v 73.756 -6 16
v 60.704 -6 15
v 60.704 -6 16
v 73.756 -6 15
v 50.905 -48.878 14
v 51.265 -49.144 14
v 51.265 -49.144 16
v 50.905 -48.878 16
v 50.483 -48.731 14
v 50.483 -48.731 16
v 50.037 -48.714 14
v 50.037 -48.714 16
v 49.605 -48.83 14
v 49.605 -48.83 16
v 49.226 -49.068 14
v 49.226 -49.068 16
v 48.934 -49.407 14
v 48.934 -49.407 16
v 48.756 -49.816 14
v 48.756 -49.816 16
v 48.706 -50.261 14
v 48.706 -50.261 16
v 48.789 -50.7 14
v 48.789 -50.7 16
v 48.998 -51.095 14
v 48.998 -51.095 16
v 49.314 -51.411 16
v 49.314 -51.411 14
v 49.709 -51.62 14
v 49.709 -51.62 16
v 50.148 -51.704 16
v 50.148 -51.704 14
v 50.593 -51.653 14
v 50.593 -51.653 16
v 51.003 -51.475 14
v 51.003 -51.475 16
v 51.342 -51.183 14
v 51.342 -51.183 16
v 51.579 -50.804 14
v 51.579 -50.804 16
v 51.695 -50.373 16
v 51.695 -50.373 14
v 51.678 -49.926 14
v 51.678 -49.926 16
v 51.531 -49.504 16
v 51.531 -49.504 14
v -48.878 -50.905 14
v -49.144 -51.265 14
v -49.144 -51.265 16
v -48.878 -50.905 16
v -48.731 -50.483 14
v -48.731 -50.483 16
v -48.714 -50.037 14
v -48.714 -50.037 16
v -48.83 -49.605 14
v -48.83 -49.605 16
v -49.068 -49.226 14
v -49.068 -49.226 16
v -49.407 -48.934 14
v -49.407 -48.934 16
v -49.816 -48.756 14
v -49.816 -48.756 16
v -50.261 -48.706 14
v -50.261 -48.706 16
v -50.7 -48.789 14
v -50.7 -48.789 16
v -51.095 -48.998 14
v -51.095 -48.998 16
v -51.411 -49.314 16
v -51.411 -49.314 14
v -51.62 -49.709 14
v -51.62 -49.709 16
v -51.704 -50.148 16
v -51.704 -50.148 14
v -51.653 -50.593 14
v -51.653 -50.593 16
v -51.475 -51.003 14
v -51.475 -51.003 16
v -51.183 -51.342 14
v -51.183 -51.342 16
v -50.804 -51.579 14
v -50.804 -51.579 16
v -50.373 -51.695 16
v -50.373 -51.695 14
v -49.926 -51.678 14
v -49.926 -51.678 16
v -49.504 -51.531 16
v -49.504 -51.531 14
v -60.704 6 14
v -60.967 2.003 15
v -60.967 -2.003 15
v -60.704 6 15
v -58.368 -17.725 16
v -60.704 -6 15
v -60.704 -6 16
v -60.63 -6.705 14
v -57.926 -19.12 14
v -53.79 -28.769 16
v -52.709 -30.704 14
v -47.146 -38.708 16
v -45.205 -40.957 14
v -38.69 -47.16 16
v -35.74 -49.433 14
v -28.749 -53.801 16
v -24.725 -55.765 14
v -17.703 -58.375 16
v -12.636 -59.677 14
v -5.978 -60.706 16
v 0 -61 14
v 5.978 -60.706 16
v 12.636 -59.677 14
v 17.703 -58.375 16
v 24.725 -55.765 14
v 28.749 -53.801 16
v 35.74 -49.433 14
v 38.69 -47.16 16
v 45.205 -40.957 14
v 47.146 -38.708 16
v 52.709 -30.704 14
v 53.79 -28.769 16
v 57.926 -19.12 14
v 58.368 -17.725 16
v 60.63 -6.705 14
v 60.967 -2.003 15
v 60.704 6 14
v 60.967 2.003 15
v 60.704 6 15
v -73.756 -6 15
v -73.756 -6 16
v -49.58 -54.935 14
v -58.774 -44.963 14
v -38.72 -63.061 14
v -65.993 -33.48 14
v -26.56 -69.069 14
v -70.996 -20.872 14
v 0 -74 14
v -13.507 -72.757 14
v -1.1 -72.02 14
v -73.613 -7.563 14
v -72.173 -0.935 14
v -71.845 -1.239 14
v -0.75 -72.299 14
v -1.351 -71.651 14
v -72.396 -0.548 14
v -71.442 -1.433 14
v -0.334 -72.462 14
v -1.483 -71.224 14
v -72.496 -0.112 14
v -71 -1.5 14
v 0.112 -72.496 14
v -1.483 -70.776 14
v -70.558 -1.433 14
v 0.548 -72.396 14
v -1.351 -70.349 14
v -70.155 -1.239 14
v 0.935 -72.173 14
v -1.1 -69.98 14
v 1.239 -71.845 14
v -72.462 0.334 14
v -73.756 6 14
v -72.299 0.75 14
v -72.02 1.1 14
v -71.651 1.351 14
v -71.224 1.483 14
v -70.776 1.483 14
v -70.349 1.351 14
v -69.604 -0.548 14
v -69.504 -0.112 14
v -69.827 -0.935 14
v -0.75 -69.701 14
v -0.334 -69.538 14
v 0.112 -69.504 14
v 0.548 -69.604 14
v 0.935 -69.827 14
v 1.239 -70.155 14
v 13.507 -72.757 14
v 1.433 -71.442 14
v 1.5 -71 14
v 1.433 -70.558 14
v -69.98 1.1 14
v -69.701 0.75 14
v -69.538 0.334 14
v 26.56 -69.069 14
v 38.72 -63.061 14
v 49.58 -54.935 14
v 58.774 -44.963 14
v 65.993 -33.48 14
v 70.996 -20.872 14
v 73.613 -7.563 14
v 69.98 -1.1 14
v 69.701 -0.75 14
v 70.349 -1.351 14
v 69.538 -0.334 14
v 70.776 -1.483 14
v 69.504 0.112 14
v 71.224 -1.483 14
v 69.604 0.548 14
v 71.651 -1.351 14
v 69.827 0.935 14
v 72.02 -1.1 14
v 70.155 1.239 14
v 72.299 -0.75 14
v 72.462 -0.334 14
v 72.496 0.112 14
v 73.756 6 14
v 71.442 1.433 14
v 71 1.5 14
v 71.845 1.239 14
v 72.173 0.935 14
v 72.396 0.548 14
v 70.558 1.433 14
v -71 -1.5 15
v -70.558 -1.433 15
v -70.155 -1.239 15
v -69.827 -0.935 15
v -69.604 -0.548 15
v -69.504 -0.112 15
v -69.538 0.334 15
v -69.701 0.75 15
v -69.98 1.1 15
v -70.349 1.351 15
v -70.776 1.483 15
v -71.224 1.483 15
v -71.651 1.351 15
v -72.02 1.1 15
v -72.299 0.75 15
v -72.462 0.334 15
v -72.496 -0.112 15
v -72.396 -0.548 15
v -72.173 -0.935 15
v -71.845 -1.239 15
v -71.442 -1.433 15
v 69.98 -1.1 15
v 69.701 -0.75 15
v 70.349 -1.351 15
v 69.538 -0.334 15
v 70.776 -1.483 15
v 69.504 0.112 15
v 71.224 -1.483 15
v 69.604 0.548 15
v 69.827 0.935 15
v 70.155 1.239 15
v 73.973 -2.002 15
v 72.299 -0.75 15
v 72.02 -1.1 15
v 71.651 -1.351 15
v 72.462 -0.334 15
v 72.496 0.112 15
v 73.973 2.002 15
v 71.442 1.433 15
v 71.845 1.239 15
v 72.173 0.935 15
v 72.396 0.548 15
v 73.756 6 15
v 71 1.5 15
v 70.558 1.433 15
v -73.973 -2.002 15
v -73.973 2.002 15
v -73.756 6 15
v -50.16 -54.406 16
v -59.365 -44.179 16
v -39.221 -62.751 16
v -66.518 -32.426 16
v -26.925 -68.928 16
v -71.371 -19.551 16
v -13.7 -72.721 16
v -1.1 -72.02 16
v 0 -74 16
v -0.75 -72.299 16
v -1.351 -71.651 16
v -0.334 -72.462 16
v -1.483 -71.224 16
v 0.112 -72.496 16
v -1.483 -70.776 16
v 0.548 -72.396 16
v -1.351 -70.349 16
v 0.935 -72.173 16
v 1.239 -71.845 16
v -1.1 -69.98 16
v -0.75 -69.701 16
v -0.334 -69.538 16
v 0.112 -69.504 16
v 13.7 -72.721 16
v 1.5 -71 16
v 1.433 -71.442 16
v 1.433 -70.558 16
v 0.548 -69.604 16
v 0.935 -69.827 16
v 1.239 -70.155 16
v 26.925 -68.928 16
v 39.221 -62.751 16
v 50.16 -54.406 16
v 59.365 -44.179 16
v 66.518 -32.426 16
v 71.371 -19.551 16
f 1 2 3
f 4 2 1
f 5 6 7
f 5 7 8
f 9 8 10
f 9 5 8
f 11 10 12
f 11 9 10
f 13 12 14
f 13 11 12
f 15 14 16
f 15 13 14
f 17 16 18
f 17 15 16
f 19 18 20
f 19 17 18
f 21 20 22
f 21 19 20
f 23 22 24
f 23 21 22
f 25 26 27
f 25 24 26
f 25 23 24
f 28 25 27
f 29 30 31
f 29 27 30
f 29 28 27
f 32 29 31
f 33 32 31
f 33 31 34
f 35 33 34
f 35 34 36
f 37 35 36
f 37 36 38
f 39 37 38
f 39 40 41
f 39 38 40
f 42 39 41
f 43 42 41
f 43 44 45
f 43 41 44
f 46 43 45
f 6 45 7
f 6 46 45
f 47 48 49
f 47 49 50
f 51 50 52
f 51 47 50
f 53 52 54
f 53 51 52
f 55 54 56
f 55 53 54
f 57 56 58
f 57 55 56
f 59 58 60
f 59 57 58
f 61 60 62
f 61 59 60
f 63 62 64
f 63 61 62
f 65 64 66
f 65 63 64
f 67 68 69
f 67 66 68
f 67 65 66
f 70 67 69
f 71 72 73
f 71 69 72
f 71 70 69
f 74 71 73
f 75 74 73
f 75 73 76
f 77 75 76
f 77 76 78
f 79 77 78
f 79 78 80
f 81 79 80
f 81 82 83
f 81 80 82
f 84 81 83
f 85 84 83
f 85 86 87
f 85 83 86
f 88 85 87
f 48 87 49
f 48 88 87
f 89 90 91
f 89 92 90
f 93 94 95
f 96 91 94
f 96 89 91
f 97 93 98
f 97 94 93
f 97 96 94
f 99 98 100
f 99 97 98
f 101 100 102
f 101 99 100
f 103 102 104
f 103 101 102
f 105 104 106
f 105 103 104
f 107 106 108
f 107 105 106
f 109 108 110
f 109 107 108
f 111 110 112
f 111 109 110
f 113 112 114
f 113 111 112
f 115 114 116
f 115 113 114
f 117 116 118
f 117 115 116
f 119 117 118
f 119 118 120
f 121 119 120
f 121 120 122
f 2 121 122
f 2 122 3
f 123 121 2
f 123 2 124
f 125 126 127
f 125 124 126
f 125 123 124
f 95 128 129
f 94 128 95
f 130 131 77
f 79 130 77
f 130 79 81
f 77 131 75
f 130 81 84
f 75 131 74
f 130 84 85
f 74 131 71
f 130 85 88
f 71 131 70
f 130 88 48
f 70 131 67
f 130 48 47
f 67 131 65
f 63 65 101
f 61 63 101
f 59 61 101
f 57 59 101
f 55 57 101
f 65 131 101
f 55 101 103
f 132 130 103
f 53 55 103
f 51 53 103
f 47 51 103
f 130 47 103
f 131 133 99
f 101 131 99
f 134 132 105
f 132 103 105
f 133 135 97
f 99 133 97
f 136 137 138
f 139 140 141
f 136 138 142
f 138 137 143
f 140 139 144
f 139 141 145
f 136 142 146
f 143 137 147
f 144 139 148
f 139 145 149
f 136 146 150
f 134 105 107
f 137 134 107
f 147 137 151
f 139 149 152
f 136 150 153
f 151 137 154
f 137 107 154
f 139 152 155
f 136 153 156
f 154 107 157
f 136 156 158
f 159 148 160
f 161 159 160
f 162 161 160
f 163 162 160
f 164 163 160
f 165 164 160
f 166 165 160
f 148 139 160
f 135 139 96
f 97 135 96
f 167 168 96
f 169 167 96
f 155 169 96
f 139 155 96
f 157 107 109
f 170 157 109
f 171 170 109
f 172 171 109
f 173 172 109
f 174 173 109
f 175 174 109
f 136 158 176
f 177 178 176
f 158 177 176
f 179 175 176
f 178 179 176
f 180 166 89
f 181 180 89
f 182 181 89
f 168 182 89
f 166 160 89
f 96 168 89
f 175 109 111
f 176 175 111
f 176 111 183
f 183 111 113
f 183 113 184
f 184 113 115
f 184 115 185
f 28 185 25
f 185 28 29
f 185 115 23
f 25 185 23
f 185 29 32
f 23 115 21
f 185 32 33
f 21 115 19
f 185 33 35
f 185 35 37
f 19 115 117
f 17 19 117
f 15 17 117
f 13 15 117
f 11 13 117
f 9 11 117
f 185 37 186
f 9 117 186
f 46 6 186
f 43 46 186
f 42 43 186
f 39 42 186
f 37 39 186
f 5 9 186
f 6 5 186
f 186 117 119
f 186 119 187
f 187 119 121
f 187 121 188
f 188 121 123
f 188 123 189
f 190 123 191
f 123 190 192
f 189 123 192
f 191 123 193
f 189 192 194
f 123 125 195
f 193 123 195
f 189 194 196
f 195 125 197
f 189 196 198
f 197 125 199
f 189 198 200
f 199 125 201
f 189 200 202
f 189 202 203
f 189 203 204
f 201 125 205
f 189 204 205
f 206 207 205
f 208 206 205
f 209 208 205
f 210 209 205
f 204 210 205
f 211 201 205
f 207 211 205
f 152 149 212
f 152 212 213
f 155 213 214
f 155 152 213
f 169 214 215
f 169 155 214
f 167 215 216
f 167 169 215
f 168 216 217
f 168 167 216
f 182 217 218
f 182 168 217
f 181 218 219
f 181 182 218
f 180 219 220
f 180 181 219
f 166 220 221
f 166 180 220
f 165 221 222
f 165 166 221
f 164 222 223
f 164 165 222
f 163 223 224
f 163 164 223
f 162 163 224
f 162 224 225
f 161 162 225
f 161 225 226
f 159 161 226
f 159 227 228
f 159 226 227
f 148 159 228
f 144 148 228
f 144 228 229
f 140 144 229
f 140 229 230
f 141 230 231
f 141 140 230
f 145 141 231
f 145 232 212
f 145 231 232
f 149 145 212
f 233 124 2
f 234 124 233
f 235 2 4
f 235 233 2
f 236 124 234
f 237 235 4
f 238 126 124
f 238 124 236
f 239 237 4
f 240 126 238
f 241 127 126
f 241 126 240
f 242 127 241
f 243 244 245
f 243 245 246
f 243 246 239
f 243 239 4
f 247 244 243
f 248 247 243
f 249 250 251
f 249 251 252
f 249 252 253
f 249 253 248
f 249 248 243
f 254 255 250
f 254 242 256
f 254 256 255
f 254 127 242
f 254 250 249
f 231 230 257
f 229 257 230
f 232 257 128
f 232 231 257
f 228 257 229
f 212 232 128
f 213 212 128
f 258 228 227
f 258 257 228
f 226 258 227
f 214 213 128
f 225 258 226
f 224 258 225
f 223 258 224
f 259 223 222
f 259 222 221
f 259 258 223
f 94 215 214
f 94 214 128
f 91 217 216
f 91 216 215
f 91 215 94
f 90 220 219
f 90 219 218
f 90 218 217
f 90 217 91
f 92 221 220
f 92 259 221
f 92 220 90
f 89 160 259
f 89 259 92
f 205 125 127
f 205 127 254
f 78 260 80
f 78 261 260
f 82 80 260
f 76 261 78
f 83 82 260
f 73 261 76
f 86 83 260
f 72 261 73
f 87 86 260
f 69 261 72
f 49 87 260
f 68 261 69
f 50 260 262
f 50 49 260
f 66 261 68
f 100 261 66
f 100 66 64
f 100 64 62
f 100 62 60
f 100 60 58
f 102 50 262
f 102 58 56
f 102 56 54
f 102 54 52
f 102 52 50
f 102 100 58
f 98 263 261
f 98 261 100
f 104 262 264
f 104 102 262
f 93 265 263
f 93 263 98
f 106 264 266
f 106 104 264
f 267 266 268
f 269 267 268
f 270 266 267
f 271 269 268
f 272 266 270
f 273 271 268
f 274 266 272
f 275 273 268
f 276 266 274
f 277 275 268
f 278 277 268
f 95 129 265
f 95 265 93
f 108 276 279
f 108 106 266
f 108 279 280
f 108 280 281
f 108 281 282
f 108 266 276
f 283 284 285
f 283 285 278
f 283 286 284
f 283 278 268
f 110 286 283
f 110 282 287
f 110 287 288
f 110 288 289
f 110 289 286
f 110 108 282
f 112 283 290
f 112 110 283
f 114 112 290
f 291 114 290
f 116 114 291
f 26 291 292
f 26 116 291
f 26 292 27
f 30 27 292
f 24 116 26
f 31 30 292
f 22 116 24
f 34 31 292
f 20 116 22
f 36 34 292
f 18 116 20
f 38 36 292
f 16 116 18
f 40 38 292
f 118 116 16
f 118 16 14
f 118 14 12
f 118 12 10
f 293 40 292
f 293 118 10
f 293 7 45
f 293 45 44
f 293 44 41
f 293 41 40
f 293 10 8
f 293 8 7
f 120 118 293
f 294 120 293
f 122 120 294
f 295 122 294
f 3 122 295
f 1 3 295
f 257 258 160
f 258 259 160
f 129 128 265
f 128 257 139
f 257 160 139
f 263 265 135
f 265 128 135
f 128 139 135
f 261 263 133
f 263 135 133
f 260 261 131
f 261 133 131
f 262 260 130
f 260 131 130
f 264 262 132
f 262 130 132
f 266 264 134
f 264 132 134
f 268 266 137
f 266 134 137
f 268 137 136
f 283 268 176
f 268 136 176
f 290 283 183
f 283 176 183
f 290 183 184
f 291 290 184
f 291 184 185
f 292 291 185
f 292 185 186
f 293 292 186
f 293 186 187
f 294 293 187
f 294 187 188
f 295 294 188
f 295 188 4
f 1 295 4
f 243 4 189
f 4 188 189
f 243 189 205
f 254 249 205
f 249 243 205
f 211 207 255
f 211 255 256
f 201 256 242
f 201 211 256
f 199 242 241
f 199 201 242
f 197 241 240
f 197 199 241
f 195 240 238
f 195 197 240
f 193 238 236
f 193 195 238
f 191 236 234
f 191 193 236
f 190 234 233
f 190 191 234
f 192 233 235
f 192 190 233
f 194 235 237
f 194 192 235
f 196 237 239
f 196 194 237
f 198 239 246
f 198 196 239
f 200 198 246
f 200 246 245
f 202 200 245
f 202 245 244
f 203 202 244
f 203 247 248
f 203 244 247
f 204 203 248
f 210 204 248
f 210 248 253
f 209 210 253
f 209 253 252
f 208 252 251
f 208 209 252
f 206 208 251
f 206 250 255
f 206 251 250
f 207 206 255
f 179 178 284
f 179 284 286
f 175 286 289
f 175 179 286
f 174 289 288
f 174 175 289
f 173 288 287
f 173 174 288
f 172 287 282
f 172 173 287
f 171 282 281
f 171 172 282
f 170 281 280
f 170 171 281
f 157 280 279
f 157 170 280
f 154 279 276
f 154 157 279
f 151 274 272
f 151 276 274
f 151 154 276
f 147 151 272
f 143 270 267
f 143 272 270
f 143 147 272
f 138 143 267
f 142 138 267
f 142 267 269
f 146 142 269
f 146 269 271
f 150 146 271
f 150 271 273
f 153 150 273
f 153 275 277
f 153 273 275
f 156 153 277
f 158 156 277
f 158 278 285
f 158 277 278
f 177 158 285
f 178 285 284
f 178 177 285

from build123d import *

# Parameters (mm, degrees)
BOX002_W                    = 180
BOX002_H                    = 180
BOX002_DEPTH                = 2
BOX003_W                    = 180
BOX003_H                    = 180
BOX003_DEPTH                = 1
CYLINDER505_R               = 1.5
CYLINDER505_DEPTH           = 60
CYLINDER505_PLACEMENT_ANGLE = 45
CYLINDER504_R               = 1.5
CYLINDER504_DEPTH           = 60
CYLINDER507_R               = 1.5
CYLINDER507_DEPTH           = 60
CYLINDER507_PLACEMENT_ANGLE = 135
CYLINDER506_R               = 1.5
CYLINDER506_DEPTH           = 60
CYLINDER506_PLACEMENT_ANGLE = 225
CYLINDER502_R               = 1.5
CYLINDER502_DEPTH           = 60
CYLINDER501_R               = 1.5
CYLINDER501_DEPTH           = 60
CYLINDER501_PLACEMENT_ANGLE = 45
CYLINDER503_R               = 1.5
CYLINDER503_DEPTH           = 60
TUBE030_R                   = 74
TUBE030_R_2                 = 61
TUBE030_DEPTH               = 2


with BuildPart() as krychle002:
    # Box002 → Box002 (new body)
    with BuildSketch(Plane(origin=(-90, -186, 14), x_dir=(1, 0, 0), z_dir=(0, 0, 1))):
        with Locations((90, 90)):
            Rectangle(BOX002_W, BOX002_H)
    extrude(amount=BOX002_DEPTH)


with BuildPart() as fusion:
    # Box003 → Box003 (new body)
    with BuildSketch(Plane(origin=(-90, -174, 14), x_dir=(1, 0, 0), z_dir=(0, 0, 1))):
        with Locations((90, 90)):
            Rectangle(BOX003_W, BOX003_H)
    extrude(amount=BOX003_DEPTH)

    # Fusion: union Krychle002
    add(krychle002.part)


with BuildPart() as v_lec505:
    # Cylinder505 → Cylinder505 (new body)
    with BuildSketch(Plane.XY):
        Circle(CYLINDER505_R)
    extrude(amount=CYLINDER505_DEPTH)


with BuildPart() as v_lec505_1:
    # Cylinder505 placement: moved
    add(v_lec505.part.moved(Location((50.204581, -50.204581, 0))).rotate(Axis((50.204581, -50.204581, 0), (0, 0, 1)), CYLINDER505_PLACEMENT_ANGLE))


with BuildPart() as v_lec504:
    # Cylinder504 → Cylinder504 (new body)
    with BuildSketch(Plane(origin=(71, 0, 0), x_dir=(0, 1, 0), z_dir=(0, 0, 1))):
        Circle(CYLINDER504_R)
    extrude(amount=CYLINDER504_DEPTH)


with BuildPart() as v_lec507:
    # Cylinder507 → Cylinder507 (new body)
    with BuildSketch(Plane.XY):
        Circle(CYLINDER507_R)
    extrude(amount=CYLINDER507_DEPTH)


with BuildPart() as v_lec507_1:
    # Cylinder507 placement: moved
    add(v_lec507.part.moved(Location((50.204581, 50.204581, 0))).rotate(Axis((50.204581, 50.204581, 0), (0, 0, 1)), CYLINDER507_PLACEMENT_ANGLE))


with BuildPart() as v_lec506:
    # Cylinder506 → Cylinder506 (new body)
    with BuildSketch(Plane.XY):
        Circle(CYLINDER506_R)
    extrude(amount=CYLINDER506_DEPTH)


with BuildPart() as v_lec506_1:
    # Cylinder506 placement: moved
    add(v_lec506.part.moved(Location((-50.204581, 50.204581, 0))).rotate(Axis((-50.204581, 50.204581, 0), (0, 0, 1)), CYLINDER506_PLACEMENT_ANGLE))


with BuildPart() as v_lec502:
    # Cylinder502 → Cylinder502 (new body)
    with BuildSketch(Plane(origin=(-71, 0, 0), x_dir=(0, -1, 0), z_dir=(0, 0, 1))):
        Circle(CYLINDER502_R)
    extrude(amount=CYLINDER502_DEPTH)


with BuildPart() as v_lec501:
    # Cylinder501 → Cylinder501 (new body)
    with BuildSketch(Plane.XY):
        Circle(CYLINDER501_R)
    extrude(amount=CYLINDER501_DEPTH)


with BuildPart() as v_lec501_1:
    # Cylinder501 placement: moved
    add(v_lec501.part.moved(Location((-50.204581, -50.204581, 0))).rotate(Axis((-50.204581, -50.204581, 0), (0, 0, -1)), CYLINDER501_PLACEMENT_ANGLE))


with BuildPart() as compound331:
    # Cylinder503 → Cylinder503 (new body)
    with BuildSketch(Plane(origin=(0, -71, 0), x_dir=(1, 0, 0), z_dir=(0, 0, 1))):
        Circle(CYLINDER503_R)
    extrude(amount=CYLINDER503_DEPTH)

    # Compound331: union Válec505, Válec504, Válec507, Válec506, Válec502, Válec501
    add(v_lec505_1.part)
    add(v_lec504.part)
    add(v_lec507_1.part)
    add(v_lec506_1.part)
    add(v_lec502.part)
    add(v_lec501_1.part)


with BuildPart() as bazovina_part_g2:
    # Tube030 → Tube030 (new body)
    with BuildSketch(Plane.XY.offset(14)):
        Circle(TUBE030_R)
        Circle(TUBE030_R_2, mode=Mode.SUBTRACT)
    extrude(amount=TUBE030_DEPTH)

    # Cut205: cut Compound331
    add(compound331.part, mode=Mode.SUBTRACT)

    # Common: intersect Fusion
    add(fusion.part, mode=Mode.INTERSECT)


solid = bazovina_part_g2.part
